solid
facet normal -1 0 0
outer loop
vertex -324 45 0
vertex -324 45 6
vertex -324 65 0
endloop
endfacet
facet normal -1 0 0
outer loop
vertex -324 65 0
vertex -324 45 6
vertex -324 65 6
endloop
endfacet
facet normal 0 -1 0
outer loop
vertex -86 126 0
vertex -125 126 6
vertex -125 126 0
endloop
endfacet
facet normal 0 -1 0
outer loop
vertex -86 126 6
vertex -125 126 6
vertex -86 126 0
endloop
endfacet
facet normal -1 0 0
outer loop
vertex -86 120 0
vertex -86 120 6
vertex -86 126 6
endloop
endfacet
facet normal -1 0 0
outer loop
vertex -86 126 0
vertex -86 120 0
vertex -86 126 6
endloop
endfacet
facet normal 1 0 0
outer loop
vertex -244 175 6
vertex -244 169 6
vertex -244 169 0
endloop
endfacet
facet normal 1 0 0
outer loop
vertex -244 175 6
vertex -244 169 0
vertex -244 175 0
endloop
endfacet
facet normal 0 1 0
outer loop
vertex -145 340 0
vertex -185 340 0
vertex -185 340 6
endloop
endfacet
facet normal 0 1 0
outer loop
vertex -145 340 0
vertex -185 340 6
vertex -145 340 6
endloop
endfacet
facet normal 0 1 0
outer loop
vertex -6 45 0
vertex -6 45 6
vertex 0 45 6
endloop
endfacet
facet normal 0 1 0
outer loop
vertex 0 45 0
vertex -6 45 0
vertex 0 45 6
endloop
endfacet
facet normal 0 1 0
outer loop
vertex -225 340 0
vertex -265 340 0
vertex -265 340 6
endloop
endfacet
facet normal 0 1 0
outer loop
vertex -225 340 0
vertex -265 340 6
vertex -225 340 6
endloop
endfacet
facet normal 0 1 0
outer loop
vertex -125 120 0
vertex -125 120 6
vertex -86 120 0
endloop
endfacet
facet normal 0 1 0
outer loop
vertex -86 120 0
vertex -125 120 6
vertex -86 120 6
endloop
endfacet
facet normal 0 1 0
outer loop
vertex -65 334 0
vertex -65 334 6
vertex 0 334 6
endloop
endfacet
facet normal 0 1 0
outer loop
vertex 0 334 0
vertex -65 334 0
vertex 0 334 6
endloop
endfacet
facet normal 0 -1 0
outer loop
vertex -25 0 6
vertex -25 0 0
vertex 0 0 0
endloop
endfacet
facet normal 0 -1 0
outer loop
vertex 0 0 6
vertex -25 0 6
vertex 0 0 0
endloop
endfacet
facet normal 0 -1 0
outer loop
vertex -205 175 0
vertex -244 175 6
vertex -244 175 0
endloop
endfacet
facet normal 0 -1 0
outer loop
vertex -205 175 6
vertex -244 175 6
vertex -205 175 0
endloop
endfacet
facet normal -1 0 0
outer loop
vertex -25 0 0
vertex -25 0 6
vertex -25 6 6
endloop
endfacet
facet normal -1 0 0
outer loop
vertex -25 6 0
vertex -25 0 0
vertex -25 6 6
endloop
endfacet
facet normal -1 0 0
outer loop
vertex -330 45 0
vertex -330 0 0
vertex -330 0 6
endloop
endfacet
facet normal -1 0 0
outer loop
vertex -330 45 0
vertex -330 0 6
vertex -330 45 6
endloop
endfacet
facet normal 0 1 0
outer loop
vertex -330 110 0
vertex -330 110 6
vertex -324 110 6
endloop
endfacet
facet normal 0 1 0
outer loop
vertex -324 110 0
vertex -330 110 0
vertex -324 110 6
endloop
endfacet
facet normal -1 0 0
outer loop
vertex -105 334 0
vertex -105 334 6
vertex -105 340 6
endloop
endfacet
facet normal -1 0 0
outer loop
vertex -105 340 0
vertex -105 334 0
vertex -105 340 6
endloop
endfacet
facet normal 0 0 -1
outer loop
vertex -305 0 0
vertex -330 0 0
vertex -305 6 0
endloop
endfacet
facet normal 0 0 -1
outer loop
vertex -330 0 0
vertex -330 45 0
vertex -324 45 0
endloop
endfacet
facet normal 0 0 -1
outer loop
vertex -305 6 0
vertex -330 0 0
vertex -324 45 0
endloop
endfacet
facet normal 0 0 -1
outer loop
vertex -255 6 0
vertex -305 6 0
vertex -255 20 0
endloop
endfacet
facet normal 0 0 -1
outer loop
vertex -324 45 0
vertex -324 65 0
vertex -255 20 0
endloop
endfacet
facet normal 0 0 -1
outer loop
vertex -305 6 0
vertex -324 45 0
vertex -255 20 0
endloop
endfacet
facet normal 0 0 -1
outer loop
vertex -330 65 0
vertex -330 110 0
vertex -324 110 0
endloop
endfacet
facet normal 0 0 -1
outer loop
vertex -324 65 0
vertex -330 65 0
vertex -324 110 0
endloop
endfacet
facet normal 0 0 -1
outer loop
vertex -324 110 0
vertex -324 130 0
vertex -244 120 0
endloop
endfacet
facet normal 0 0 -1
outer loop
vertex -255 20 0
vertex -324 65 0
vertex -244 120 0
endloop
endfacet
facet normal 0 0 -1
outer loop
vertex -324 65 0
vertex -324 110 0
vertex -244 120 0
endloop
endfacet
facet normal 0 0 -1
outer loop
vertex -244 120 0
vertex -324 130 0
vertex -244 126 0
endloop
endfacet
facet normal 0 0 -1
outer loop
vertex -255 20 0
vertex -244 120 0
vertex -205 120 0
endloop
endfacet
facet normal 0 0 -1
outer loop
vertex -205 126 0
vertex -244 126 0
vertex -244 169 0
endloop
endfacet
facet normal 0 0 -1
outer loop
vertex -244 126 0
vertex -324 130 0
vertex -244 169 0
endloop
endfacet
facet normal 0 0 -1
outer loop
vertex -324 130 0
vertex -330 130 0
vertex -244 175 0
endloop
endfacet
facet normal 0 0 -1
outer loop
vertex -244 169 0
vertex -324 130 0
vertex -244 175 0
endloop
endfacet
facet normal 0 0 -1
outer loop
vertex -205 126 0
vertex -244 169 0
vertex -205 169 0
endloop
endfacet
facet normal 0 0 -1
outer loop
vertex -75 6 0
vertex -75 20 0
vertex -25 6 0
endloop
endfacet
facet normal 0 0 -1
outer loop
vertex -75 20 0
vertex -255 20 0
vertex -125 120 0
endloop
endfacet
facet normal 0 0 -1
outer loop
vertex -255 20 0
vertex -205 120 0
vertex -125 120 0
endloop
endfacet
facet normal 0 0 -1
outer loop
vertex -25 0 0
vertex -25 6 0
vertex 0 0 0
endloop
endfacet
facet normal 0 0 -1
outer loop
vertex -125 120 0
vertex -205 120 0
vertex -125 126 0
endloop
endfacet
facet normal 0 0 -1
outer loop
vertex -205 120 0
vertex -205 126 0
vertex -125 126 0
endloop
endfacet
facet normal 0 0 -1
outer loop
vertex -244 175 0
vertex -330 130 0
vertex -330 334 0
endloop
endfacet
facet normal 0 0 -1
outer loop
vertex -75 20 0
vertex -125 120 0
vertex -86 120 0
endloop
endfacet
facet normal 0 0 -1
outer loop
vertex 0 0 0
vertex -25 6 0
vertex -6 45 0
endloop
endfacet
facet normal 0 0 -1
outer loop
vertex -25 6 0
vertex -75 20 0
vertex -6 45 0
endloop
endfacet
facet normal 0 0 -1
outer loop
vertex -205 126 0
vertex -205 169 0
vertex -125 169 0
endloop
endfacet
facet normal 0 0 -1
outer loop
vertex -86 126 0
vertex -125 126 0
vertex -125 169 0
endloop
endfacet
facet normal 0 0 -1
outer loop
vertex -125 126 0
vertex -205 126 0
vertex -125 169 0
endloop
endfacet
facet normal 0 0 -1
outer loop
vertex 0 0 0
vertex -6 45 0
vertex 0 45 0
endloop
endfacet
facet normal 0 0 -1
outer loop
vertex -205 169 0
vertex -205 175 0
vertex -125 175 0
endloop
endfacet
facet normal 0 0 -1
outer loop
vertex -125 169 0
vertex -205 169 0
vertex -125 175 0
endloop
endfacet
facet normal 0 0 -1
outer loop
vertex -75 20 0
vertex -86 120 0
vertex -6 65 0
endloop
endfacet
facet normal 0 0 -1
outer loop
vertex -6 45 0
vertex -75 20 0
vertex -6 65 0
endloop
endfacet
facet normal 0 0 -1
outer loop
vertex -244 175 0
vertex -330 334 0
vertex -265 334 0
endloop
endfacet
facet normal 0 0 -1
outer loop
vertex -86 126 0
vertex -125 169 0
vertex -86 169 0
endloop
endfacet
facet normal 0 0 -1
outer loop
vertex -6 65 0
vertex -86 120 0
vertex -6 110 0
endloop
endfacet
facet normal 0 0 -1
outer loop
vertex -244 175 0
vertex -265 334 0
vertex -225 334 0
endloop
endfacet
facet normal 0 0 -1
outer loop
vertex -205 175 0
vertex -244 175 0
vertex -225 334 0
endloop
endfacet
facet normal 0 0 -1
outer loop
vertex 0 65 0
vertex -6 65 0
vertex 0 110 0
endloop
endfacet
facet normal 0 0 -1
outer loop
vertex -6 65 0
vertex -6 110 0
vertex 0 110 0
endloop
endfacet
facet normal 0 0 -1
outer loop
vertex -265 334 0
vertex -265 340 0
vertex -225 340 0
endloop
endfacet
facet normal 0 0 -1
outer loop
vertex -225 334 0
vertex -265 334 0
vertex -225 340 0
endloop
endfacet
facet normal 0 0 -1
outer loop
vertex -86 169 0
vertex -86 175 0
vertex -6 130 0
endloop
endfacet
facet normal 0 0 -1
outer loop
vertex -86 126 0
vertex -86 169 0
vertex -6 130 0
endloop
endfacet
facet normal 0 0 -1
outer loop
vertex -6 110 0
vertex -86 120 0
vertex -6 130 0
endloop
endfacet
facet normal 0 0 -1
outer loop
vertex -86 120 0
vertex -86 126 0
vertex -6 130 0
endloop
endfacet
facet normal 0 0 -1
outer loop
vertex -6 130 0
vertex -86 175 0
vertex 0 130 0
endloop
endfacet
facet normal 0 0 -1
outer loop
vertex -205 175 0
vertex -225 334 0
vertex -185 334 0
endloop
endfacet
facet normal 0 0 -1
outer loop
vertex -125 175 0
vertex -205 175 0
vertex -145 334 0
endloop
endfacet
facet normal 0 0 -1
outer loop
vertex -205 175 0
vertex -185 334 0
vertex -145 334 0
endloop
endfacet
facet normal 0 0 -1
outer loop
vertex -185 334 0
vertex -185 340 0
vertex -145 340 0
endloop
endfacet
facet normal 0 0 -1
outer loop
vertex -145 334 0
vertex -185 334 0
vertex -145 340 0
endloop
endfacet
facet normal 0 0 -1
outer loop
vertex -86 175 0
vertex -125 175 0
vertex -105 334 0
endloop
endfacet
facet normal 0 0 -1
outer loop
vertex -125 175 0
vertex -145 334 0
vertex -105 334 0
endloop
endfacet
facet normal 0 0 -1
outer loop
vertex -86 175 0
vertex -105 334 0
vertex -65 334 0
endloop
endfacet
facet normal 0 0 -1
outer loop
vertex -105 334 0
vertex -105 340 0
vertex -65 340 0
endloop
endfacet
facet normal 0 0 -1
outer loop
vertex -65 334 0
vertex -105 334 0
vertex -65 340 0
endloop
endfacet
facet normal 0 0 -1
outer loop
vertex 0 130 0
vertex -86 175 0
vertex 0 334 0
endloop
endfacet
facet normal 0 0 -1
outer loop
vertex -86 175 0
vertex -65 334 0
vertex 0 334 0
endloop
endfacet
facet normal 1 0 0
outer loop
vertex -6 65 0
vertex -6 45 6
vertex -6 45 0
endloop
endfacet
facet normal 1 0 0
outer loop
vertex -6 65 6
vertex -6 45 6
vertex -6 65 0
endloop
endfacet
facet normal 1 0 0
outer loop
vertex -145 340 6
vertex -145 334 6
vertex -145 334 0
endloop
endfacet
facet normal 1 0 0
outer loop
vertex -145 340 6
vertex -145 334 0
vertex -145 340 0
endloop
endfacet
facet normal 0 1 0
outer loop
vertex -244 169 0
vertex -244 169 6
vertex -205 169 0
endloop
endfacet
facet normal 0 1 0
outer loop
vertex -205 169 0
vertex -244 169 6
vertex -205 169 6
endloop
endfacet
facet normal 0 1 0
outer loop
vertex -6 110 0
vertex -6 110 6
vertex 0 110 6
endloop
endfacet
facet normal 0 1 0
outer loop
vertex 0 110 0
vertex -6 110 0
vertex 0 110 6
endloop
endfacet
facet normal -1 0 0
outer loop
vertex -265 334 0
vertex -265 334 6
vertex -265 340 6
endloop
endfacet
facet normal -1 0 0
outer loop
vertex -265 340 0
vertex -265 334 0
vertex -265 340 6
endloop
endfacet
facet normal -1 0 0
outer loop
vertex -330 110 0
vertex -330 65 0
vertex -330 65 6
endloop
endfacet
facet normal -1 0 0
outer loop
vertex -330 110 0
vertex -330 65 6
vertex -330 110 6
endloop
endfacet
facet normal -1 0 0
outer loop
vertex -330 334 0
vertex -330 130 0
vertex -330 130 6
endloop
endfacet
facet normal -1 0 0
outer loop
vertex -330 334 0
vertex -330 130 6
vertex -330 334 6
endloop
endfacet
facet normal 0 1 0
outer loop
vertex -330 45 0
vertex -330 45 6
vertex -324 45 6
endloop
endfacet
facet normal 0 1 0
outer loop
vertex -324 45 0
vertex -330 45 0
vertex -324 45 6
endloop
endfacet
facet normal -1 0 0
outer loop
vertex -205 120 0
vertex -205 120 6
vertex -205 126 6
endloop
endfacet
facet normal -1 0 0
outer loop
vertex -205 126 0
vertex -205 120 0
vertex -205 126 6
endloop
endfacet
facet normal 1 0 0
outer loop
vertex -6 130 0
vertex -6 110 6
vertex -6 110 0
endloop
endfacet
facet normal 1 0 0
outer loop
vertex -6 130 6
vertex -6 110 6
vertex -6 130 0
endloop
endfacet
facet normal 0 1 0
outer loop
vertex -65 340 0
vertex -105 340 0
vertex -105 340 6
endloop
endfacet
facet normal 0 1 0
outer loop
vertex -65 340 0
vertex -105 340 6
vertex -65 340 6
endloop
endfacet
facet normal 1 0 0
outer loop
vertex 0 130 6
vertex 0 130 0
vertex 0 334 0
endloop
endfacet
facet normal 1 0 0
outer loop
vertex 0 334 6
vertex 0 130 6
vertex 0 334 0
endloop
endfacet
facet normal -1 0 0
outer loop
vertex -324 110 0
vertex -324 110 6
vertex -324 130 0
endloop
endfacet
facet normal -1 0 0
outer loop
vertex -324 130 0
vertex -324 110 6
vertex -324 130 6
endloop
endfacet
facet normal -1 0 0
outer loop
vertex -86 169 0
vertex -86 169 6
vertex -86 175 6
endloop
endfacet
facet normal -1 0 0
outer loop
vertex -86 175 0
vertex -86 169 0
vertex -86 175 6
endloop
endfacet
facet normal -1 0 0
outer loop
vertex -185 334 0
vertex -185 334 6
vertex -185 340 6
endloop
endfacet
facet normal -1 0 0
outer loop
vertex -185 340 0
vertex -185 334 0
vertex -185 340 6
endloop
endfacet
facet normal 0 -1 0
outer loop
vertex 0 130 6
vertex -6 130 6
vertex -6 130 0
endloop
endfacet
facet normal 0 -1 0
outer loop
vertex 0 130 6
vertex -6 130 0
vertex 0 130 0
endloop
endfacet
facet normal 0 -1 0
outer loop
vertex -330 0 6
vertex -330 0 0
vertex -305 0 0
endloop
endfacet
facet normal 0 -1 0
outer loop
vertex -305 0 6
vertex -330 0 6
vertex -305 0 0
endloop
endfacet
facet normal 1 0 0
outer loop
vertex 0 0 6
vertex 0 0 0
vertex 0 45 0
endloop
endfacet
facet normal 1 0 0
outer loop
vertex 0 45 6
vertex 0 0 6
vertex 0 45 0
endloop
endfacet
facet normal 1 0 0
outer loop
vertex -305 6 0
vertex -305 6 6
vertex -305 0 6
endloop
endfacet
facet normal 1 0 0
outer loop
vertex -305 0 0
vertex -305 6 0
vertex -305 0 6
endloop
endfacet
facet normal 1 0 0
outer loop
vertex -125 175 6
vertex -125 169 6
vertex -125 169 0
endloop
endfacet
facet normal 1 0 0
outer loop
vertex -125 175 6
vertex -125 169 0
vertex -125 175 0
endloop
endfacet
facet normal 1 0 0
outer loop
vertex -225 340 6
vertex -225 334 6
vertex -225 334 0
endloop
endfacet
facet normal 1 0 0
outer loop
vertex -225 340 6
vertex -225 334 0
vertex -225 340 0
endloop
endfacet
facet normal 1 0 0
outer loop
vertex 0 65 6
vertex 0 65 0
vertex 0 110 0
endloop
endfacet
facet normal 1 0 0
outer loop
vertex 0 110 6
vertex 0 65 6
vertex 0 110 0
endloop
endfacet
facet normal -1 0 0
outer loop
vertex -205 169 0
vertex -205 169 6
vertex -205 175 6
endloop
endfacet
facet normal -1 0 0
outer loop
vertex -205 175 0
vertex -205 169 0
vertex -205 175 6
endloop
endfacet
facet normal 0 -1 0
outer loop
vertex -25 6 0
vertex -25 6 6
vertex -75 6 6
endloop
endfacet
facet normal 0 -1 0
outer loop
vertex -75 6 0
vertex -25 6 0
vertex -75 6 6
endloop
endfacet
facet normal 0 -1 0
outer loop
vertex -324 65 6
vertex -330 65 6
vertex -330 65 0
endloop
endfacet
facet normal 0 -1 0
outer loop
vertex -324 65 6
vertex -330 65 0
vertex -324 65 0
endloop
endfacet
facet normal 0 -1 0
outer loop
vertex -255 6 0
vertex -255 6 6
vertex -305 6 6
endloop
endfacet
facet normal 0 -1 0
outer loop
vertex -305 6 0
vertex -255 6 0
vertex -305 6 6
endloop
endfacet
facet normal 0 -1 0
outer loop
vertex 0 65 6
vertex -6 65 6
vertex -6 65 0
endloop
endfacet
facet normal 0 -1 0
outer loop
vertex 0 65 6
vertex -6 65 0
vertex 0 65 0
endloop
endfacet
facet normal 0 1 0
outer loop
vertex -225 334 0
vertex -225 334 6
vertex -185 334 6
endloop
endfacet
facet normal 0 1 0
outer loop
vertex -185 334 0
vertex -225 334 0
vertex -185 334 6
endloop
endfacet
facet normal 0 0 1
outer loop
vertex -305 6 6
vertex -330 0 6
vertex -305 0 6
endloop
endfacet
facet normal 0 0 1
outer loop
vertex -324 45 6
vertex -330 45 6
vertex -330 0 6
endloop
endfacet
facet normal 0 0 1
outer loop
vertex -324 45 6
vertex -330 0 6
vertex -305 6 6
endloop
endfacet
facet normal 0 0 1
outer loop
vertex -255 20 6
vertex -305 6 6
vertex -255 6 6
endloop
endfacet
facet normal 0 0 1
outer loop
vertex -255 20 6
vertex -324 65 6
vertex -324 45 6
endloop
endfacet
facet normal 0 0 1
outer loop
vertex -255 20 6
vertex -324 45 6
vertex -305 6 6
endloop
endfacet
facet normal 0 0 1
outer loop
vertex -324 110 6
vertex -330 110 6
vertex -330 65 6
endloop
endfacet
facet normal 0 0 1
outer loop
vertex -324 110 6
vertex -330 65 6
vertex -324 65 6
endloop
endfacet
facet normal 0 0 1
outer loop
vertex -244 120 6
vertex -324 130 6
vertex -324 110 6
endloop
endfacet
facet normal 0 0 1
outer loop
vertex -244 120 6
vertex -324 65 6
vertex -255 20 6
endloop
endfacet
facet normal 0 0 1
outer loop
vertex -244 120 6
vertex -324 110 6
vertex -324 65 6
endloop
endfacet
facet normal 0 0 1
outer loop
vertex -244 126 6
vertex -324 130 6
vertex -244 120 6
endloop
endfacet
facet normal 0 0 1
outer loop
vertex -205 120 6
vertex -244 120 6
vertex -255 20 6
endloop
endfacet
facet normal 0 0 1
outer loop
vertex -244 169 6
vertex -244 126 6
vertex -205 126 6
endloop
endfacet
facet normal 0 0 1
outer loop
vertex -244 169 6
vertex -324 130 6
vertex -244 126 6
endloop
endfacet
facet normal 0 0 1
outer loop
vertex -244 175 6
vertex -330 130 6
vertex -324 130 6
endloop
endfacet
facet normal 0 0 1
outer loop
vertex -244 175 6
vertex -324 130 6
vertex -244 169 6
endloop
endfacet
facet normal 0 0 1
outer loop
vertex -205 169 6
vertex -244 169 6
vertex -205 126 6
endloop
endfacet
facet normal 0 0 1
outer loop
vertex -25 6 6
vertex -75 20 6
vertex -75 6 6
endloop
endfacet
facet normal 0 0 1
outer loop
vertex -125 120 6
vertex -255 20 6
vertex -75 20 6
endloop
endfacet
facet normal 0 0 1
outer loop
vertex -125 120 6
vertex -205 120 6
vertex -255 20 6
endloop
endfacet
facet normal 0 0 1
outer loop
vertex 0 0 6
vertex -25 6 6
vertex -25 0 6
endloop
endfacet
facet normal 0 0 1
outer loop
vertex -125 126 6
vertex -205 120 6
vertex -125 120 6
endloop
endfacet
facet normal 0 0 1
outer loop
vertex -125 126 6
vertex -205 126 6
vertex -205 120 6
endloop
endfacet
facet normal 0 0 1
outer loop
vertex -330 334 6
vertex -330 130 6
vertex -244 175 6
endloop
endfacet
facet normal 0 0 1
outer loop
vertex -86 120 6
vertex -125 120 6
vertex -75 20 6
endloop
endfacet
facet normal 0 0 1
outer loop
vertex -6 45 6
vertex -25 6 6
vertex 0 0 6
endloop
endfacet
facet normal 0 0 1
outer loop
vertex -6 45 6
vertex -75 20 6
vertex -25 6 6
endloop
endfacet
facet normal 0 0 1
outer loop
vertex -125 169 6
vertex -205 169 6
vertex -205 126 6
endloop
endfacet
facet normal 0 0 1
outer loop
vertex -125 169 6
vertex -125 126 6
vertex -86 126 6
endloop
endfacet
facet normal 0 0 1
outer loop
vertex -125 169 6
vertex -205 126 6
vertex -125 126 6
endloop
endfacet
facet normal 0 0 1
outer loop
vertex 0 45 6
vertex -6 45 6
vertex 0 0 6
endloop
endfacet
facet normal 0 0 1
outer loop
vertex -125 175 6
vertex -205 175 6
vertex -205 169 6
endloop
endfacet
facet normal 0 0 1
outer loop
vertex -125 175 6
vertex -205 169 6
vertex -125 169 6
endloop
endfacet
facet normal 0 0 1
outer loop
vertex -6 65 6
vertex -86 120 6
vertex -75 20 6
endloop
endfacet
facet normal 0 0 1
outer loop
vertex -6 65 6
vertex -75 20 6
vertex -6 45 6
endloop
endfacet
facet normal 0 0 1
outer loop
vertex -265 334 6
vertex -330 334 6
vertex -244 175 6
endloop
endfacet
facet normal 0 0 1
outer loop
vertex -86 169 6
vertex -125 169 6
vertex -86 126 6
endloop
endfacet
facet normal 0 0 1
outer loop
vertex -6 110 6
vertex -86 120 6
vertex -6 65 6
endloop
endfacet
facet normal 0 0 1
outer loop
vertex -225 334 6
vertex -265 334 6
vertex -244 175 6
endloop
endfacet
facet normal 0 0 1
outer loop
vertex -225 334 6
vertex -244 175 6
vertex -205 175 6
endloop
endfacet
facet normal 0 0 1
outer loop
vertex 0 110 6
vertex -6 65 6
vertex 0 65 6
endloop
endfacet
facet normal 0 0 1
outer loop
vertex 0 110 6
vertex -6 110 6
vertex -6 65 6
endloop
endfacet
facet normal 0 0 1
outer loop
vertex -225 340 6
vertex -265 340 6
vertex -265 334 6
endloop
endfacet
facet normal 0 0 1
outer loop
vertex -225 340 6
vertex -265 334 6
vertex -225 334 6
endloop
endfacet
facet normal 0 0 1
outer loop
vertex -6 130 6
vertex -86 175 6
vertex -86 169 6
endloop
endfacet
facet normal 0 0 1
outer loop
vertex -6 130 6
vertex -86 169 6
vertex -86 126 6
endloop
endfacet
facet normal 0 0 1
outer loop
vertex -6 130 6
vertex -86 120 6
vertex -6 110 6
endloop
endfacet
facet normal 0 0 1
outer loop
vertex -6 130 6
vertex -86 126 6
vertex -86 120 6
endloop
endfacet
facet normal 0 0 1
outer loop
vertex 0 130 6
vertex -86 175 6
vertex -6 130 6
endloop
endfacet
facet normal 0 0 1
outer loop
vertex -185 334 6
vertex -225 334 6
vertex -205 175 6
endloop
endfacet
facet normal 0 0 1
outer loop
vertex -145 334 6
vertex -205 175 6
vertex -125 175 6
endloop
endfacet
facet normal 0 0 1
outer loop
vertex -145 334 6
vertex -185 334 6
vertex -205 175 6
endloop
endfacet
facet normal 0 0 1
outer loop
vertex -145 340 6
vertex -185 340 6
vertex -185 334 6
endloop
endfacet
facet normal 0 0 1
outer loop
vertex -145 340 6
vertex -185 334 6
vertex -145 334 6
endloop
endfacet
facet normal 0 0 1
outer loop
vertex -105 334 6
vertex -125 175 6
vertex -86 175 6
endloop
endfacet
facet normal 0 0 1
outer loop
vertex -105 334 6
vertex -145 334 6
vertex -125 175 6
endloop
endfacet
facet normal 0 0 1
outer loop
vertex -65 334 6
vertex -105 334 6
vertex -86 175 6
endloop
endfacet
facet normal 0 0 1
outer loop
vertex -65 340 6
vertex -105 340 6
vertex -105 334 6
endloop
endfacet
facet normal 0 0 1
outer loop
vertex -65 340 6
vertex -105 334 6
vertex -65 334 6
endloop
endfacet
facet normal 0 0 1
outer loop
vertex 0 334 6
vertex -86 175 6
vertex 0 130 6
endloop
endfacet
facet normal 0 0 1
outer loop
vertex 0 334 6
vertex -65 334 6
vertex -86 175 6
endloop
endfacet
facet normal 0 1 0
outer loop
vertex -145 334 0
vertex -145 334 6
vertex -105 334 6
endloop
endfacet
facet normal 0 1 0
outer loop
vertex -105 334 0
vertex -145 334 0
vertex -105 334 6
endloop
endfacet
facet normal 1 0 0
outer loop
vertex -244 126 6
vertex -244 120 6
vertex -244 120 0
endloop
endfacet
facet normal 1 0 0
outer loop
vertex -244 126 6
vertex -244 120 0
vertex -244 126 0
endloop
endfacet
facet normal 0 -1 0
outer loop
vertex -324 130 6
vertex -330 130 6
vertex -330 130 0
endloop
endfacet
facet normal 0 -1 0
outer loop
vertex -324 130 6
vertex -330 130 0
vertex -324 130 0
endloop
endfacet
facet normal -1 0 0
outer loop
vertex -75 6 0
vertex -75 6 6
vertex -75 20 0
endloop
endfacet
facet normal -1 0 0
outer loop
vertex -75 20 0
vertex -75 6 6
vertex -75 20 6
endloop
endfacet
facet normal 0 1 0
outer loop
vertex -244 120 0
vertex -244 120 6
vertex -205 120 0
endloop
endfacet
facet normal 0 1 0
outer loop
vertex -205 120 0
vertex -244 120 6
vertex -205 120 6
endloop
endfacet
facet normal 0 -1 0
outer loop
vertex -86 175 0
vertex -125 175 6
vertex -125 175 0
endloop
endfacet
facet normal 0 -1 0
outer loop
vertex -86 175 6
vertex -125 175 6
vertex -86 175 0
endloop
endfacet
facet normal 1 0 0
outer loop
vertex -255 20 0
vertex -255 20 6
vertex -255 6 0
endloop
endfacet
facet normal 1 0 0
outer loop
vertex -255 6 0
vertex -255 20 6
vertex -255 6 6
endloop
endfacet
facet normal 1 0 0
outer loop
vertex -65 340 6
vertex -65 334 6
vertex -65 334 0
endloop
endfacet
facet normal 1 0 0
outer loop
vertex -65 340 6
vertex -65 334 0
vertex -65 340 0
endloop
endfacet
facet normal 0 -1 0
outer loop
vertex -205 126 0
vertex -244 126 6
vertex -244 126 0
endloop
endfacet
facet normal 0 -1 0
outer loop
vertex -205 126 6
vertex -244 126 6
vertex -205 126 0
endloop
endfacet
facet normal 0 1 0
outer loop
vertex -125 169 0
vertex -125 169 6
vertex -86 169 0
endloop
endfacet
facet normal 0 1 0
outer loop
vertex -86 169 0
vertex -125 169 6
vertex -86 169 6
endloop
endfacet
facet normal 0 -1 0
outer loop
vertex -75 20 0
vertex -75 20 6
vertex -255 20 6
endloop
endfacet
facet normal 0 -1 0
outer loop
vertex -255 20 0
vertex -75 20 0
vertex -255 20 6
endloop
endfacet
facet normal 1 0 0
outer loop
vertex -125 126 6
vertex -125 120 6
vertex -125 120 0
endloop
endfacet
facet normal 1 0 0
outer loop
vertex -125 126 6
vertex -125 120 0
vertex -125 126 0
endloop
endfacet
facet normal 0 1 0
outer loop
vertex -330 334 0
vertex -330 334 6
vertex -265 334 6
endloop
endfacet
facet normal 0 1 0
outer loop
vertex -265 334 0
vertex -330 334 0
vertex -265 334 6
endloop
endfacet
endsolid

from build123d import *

# Parameters (mm, degrees)
ESQUISSE1_W             = 330
ESQUISSE1_H             = 340
BOSS_EXTRU_1_DEPTH      = 6
ESQUISSE2_W             = 39
ESQUISSE2_H             = 6
ESQUISSE2_W_2           = 6
ESQUISSE2_H_2           = 20
ESQUISSE2_W_3           = 65
ESQUISSE2_W_4           = 40
ENL_V_MAT_ENCOCHE_DEPTH = 474.852297662


with BuildPart() as part:
    # Esquisse1 → Boss.-Extru.1 (new body)
    with BuildSketch(Plane.XY):
        with Locations((-165, 170)):
            Rectangle(ESQUISSE1_W, ESQUISSE1_H)
    extrude(amount=BOSS_EXTRU_1_DEPTH)

    # Esquisse2 → Enlèv. mat encoche (cut, through all)
    with BuildSketch(Plane.XY.offset(6)):
        with Locations((-224.5, 172)):
            Rectangle(ESQUISSE2_W, ESQUISSE2_H)
        with Locations((-105.5, 172)):
            Rectangle(ESQUISSE2_W, ESQUISSE2_H)
        with Locations((-327, 120)):
            Rectangle(ESQUISSE2_W_2, ESQUISSE2_H_2)
        with Locations((-327, 55)):
            Rectangle(ESQUISSE2_W_2, ESQUISSE2_H_2)
        with Locations((-3, 120)):
            Rectangle(ESQUISSE2_W_2, ESQUISSE2_H_2)
        with Locations((-3, 55)):
            Rectangle(ESQUISSE2_W_2, ESQUISSE2_H_2)
        with Locations((-224.5, 123)):
            Rectangle(ESQUISSE2_W, ESQUISSE2_H)
        with Locations((-105.5, 123)):
            Rectangle(ESQUISSE2_W, ESQUISSE2_H)
        with Locations((-297.5, 337)):
            Rectangle(ESQUISSE2_W_3, ESQUISSE2_H)
        with Locations((-205, 337)):
            Rectangle(ESQUISSE2_W_4, ESQUISSE2_H)
        with Locations((-125, 337)):
            Rectangle(ESQUISSE2_W_4, ESQUISSE2_H)
        with Locations((-32.5, 337)):
            Rectangle(ESQUISSE2_W_3, ESQUISSE2_H)
        Polygon((-305, 0), (-255, 0), (-75, 0), (-25, 0), (-25, 6), (-75, 6), (-75, 20), (-255, 20), (-255, 6), (-305, 6), align=None)
    extrude(amount=-ENL_V_MAT_ENCOCHE_DEPTH, mode=Mode.SUBTRACT)


solid = part.part
